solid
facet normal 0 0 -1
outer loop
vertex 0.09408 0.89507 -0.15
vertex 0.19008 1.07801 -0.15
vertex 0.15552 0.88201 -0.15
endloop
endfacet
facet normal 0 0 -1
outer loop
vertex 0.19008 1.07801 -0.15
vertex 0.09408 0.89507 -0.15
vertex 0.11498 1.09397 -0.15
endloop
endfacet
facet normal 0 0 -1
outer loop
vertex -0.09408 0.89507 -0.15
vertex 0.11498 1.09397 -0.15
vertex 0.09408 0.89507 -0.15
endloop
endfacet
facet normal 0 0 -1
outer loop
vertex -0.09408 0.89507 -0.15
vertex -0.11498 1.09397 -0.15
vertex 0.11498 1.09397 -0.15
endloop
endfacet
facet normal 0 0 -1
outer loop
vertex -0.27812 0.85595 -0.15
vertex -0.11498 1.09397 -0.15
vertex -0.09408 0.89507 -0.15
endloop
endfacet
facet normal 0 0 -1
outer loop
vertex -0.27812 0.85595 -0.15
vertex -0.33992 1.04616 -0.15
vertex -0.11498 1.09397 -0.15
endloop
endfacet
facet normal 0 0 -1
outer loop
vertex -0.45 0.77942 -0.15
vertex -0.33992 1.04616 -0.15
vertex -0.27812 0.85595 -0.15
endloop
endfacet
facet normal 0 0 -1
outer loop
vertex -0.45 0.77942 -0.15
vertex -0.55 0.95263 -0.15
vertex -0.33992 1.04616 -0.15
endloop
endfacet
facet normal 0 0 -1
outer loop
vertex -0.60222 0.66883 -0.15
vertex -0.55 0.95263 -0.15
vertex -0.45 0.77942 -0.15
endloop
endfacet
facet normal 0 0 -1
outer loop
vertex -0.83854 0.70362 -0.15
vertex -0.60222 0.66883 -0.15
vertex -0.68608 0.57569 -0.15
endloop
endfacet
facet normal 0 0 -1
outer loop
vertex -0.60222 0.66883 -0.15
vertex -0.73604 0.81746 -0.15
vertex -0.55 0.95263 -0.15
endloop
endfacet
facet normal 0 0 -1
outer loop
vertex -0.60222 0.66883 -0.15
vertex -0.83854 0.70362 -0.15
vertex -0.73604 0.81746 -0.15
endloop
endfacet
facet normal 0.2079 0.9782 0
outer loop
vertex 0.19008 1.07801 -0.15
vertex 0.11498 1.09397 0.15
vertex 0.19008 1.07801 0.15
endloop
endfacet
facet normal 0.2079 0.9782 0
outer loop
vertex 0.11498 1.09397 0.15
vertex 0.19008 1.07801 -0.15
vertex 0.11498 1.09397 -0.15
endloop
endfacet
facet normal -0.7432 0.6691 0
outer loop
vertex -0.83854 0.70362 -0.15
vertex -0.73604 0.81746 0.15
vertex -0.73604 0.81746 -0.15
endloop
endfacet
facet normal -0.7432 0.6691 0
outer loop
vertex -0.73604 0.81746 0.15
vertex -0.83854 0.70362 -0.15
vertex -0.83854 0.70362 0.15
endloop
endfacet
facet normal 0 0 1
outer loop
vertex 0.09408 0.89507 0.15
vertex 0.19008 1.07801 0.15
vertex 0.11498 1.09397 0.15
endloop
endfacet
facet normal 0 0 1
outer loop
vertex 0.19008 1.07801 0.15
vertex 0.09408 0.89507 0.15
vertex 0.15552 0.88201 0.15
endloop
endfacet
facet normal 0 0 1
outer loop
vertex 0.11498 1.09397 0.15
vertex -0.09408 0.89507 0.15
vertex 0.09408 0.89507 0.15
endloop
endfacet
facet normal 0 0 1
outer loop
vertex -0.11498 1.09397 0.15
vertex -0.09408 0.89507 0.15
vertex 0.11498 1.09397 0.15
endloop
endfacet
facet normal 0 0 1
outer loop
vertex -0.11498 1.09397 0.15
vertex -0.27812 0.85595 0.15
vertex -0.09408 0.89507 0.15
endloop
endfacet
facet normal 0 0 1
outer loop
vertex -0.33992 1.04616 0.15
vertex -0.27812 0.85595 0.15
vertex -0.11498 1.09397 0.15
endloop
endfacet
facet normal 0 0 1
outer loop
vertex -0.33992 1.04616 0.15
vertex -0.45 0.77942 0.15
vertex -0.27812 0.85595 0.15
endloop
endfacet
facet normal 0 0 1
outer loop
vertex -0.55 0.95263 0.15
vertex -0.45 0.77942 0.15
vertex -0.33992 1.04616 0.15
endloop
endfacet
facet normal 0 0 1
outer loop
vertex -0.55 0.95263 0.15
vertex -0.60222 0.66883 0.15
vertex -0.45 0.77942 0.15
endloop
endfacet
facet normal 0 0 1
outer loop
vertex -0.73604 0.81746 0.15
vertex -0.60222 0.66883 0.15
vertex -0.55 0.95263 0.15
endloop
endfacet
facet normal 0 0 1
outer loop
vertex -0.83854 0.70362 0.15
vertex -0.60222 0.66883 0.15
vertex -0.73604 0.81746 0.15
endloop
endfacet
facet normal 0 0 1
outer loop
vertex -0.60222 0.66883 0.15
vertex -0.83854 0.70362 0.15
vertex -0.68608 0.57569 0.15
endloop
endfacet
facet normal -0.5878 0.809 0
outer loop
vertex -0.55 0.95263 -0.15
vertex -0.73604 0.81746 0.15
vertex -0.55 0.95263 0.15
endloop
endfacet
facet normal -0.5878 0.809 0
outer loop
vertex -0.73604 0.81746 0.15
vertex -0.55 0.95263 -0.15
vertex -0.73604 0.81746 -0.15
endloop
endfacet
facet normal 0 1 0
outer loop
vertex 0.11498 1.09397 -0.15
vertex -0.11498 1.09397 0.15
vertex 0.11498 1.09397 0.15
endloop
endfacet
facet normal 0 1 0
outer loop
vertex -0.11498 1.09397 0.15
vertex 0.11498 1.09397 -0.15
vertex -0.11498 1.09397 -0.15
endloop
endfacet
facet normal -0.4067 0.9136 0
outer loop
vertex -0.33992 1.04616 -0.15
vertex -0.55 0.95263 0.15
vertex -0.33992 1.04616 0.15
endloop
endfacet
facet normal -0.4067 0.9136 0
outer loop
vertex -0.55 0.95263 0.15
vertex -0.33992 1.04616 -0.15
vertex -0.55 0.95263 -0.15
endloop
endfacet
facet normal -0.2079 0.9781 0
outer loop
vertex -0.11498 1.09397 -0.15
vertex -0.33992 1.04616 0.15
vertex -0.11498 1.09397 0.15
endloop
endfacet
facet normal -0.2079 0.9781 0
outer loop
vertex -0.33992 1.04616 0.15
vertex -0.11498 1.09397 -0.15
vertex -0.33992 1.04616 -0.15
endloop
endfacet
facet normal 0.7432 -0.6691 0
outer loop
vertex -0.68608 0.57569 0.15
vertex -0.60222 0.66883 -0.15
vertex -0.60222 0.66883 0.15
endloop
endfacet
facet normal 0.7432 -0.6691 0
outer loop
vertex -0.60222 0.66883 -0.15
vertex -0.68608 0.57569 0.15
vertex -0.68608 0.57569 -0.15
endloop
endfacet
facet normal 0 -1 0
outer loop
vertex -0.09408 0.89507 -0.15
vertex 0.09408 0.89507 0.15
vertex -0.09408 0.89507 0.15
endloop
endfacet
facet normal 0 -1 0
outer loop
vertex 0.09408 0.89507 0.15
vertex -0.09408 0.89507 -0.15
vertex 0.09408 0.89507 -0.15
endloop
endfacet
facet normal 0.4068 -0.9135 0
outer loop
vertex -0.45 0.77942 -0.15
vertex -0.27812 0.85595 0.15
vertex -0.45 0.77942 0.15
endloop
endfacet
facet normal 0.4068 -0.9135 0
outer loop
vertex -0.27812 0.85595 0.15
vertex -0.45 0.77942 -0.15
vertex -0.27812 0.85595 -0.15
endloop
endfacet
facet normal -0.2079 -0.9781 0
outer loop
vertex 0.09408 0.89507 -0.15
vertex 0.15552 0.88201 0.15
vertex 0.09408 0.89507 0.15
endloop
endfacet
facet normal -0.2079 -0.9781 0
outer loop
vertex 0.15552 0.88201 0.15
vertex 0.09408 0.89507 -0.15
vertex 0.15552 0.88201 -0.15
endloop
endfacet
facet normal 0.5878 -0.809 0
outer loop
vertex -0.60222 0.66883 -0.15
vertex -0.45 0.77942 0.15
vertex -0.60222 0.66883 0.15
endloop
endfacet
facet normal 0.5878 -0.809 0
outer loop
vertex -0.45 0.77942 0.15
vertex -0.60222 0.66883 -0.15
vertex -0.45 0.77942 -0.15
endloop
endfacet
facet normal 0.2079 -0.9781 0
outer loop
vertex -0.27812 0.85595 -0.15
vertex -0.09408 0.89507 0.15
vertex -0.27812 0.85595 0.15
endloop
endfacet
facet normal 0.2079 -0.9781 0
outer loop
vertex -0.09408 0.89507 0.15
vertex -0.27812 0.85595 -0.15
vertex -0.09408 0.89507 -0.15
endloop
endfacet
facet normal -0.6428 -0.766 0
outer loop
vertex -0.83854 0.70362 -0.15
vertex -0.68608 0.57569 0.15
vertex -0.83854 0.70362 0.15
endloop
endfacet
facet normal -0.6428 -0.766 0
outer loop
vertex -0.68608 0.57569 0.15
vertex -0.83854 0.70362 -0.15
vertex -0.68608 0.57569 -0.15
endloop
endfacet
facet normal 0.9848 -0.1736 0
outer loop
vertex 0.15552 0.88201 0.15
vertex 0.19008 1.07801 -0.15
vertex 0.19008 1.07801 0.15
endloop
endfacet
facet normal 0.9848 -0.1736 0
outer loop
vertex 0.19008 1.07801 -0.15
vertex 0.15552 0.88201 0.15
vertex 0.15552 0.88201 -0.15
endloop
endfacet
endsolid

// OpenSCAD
module ring(width, height) {
	difference() {
		cylinder(r = 1 + width / 2, h = height, center = true, $fs = 0.01);
		cylinder(r = 1 - width / 2, h = height * 2, center = true, $fs = 0.01);
	}	
}

module angle_cutter(a1, a2, length, height) {

	module rect(a) {
		rotate([0, 0, -a])
			translate([length / 2, 0, 0])
				cube([length, 2 * length, height], true);
	}

	module rectpie0(a) {
		if (a <= 180) {
			intersection() {
				rect(0);
				rect(180 + a);
			}
		}
		else {
			union() {
				rect(0);
				rect(180 + a);
			}
		}
	}

	a1norm = a1 % 360;
	a2norm = a2 % 360;
	a2norm2 = a2norm < a1norm ? a2norm + 360 : a2norm;
	adiff = a2norm2 - a1norm;

	rotate([0, 0, -a1norm])
		rectpie0(adiff);
}

module arc(width, height, a1, a2) {
	intersection() {
		ring(width, height);
		angle_cutter(a1, a2, 1 + width, height * 2 );
	}
}

arc(0.2, 0.3, 1030, 1090);
